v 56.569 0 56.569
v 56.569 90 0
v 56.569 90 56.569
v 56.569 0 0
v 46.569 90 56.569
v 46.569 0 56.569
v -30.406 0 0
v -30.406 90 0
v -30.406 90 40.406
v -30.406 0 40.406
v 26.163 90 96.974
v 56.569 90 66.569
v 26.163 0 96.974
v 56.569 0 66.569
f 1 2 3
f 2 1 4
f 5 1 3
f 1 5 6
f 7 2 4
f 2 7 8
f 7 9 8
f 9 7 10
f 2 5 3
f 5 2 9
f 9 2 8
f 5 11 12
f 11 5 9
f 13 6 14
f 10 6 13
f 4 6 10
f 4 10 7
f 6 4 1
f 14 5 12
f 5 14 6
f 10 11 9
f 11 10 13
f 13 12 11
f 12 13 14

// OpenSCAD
// case riser wedges

// make noise 104hp case, 80deg riser wedge
/*
w = 26; // width of riser
x = 130.55; // case dimensions
y = 546.10; 
z =  69.85;
z_alt = z + 100; // inflated depth to clear overlap
t = -80; // angle of rotation, 'theta', in degrees
r = 20; // rise in mm
*/

// norns 45deg riser wedge
w = 90;
x = 80;
y = 90;
z = 43; 
z_alt = z + 100; // inflated depth to clear overlap
t = -45; // angle of rotation, 'theta', in degrees
r = 10; // rise in mm


module case() {
  translate([0, 0, r]) // raised
    rotate([0, t, 0]) // rotated
      cube([x, y, z]);
}

module riser(x_add) {
  // x-offset generated by rotation of z component, plus additional x-offset
  x_z_offset = -sin(t) * z + x_add; 
  x_y_offset = cos(t) * x; // x-offset generated by rotation of y component
  z_x_offset = -sin(t) * x; // z-offset generated by rotation of x component

  difference() {
    // encapsulating volume
      translate([-x_z_offset, 0, 0])
        cube([x_z_offset + x_y_offset, w, z_x_offset]);

    // the case, tilted and raised.
    // exaggerated depth to clear front panel
    translate([0, 0, r])
    rotate([0, t, 0])
      cube([x, y, z_alt]);
  }
}

// currently manually scaled/hollowed
// s/b calculated from riser shape and angle
module hollow_riser() {
  difference() {
    riser(0);
    translate([4, 0, 2])
      scale([0.6, 1.1, 0.6])
        riser(40);
  }
}

case();
riser(0);
//hollow_riser();
